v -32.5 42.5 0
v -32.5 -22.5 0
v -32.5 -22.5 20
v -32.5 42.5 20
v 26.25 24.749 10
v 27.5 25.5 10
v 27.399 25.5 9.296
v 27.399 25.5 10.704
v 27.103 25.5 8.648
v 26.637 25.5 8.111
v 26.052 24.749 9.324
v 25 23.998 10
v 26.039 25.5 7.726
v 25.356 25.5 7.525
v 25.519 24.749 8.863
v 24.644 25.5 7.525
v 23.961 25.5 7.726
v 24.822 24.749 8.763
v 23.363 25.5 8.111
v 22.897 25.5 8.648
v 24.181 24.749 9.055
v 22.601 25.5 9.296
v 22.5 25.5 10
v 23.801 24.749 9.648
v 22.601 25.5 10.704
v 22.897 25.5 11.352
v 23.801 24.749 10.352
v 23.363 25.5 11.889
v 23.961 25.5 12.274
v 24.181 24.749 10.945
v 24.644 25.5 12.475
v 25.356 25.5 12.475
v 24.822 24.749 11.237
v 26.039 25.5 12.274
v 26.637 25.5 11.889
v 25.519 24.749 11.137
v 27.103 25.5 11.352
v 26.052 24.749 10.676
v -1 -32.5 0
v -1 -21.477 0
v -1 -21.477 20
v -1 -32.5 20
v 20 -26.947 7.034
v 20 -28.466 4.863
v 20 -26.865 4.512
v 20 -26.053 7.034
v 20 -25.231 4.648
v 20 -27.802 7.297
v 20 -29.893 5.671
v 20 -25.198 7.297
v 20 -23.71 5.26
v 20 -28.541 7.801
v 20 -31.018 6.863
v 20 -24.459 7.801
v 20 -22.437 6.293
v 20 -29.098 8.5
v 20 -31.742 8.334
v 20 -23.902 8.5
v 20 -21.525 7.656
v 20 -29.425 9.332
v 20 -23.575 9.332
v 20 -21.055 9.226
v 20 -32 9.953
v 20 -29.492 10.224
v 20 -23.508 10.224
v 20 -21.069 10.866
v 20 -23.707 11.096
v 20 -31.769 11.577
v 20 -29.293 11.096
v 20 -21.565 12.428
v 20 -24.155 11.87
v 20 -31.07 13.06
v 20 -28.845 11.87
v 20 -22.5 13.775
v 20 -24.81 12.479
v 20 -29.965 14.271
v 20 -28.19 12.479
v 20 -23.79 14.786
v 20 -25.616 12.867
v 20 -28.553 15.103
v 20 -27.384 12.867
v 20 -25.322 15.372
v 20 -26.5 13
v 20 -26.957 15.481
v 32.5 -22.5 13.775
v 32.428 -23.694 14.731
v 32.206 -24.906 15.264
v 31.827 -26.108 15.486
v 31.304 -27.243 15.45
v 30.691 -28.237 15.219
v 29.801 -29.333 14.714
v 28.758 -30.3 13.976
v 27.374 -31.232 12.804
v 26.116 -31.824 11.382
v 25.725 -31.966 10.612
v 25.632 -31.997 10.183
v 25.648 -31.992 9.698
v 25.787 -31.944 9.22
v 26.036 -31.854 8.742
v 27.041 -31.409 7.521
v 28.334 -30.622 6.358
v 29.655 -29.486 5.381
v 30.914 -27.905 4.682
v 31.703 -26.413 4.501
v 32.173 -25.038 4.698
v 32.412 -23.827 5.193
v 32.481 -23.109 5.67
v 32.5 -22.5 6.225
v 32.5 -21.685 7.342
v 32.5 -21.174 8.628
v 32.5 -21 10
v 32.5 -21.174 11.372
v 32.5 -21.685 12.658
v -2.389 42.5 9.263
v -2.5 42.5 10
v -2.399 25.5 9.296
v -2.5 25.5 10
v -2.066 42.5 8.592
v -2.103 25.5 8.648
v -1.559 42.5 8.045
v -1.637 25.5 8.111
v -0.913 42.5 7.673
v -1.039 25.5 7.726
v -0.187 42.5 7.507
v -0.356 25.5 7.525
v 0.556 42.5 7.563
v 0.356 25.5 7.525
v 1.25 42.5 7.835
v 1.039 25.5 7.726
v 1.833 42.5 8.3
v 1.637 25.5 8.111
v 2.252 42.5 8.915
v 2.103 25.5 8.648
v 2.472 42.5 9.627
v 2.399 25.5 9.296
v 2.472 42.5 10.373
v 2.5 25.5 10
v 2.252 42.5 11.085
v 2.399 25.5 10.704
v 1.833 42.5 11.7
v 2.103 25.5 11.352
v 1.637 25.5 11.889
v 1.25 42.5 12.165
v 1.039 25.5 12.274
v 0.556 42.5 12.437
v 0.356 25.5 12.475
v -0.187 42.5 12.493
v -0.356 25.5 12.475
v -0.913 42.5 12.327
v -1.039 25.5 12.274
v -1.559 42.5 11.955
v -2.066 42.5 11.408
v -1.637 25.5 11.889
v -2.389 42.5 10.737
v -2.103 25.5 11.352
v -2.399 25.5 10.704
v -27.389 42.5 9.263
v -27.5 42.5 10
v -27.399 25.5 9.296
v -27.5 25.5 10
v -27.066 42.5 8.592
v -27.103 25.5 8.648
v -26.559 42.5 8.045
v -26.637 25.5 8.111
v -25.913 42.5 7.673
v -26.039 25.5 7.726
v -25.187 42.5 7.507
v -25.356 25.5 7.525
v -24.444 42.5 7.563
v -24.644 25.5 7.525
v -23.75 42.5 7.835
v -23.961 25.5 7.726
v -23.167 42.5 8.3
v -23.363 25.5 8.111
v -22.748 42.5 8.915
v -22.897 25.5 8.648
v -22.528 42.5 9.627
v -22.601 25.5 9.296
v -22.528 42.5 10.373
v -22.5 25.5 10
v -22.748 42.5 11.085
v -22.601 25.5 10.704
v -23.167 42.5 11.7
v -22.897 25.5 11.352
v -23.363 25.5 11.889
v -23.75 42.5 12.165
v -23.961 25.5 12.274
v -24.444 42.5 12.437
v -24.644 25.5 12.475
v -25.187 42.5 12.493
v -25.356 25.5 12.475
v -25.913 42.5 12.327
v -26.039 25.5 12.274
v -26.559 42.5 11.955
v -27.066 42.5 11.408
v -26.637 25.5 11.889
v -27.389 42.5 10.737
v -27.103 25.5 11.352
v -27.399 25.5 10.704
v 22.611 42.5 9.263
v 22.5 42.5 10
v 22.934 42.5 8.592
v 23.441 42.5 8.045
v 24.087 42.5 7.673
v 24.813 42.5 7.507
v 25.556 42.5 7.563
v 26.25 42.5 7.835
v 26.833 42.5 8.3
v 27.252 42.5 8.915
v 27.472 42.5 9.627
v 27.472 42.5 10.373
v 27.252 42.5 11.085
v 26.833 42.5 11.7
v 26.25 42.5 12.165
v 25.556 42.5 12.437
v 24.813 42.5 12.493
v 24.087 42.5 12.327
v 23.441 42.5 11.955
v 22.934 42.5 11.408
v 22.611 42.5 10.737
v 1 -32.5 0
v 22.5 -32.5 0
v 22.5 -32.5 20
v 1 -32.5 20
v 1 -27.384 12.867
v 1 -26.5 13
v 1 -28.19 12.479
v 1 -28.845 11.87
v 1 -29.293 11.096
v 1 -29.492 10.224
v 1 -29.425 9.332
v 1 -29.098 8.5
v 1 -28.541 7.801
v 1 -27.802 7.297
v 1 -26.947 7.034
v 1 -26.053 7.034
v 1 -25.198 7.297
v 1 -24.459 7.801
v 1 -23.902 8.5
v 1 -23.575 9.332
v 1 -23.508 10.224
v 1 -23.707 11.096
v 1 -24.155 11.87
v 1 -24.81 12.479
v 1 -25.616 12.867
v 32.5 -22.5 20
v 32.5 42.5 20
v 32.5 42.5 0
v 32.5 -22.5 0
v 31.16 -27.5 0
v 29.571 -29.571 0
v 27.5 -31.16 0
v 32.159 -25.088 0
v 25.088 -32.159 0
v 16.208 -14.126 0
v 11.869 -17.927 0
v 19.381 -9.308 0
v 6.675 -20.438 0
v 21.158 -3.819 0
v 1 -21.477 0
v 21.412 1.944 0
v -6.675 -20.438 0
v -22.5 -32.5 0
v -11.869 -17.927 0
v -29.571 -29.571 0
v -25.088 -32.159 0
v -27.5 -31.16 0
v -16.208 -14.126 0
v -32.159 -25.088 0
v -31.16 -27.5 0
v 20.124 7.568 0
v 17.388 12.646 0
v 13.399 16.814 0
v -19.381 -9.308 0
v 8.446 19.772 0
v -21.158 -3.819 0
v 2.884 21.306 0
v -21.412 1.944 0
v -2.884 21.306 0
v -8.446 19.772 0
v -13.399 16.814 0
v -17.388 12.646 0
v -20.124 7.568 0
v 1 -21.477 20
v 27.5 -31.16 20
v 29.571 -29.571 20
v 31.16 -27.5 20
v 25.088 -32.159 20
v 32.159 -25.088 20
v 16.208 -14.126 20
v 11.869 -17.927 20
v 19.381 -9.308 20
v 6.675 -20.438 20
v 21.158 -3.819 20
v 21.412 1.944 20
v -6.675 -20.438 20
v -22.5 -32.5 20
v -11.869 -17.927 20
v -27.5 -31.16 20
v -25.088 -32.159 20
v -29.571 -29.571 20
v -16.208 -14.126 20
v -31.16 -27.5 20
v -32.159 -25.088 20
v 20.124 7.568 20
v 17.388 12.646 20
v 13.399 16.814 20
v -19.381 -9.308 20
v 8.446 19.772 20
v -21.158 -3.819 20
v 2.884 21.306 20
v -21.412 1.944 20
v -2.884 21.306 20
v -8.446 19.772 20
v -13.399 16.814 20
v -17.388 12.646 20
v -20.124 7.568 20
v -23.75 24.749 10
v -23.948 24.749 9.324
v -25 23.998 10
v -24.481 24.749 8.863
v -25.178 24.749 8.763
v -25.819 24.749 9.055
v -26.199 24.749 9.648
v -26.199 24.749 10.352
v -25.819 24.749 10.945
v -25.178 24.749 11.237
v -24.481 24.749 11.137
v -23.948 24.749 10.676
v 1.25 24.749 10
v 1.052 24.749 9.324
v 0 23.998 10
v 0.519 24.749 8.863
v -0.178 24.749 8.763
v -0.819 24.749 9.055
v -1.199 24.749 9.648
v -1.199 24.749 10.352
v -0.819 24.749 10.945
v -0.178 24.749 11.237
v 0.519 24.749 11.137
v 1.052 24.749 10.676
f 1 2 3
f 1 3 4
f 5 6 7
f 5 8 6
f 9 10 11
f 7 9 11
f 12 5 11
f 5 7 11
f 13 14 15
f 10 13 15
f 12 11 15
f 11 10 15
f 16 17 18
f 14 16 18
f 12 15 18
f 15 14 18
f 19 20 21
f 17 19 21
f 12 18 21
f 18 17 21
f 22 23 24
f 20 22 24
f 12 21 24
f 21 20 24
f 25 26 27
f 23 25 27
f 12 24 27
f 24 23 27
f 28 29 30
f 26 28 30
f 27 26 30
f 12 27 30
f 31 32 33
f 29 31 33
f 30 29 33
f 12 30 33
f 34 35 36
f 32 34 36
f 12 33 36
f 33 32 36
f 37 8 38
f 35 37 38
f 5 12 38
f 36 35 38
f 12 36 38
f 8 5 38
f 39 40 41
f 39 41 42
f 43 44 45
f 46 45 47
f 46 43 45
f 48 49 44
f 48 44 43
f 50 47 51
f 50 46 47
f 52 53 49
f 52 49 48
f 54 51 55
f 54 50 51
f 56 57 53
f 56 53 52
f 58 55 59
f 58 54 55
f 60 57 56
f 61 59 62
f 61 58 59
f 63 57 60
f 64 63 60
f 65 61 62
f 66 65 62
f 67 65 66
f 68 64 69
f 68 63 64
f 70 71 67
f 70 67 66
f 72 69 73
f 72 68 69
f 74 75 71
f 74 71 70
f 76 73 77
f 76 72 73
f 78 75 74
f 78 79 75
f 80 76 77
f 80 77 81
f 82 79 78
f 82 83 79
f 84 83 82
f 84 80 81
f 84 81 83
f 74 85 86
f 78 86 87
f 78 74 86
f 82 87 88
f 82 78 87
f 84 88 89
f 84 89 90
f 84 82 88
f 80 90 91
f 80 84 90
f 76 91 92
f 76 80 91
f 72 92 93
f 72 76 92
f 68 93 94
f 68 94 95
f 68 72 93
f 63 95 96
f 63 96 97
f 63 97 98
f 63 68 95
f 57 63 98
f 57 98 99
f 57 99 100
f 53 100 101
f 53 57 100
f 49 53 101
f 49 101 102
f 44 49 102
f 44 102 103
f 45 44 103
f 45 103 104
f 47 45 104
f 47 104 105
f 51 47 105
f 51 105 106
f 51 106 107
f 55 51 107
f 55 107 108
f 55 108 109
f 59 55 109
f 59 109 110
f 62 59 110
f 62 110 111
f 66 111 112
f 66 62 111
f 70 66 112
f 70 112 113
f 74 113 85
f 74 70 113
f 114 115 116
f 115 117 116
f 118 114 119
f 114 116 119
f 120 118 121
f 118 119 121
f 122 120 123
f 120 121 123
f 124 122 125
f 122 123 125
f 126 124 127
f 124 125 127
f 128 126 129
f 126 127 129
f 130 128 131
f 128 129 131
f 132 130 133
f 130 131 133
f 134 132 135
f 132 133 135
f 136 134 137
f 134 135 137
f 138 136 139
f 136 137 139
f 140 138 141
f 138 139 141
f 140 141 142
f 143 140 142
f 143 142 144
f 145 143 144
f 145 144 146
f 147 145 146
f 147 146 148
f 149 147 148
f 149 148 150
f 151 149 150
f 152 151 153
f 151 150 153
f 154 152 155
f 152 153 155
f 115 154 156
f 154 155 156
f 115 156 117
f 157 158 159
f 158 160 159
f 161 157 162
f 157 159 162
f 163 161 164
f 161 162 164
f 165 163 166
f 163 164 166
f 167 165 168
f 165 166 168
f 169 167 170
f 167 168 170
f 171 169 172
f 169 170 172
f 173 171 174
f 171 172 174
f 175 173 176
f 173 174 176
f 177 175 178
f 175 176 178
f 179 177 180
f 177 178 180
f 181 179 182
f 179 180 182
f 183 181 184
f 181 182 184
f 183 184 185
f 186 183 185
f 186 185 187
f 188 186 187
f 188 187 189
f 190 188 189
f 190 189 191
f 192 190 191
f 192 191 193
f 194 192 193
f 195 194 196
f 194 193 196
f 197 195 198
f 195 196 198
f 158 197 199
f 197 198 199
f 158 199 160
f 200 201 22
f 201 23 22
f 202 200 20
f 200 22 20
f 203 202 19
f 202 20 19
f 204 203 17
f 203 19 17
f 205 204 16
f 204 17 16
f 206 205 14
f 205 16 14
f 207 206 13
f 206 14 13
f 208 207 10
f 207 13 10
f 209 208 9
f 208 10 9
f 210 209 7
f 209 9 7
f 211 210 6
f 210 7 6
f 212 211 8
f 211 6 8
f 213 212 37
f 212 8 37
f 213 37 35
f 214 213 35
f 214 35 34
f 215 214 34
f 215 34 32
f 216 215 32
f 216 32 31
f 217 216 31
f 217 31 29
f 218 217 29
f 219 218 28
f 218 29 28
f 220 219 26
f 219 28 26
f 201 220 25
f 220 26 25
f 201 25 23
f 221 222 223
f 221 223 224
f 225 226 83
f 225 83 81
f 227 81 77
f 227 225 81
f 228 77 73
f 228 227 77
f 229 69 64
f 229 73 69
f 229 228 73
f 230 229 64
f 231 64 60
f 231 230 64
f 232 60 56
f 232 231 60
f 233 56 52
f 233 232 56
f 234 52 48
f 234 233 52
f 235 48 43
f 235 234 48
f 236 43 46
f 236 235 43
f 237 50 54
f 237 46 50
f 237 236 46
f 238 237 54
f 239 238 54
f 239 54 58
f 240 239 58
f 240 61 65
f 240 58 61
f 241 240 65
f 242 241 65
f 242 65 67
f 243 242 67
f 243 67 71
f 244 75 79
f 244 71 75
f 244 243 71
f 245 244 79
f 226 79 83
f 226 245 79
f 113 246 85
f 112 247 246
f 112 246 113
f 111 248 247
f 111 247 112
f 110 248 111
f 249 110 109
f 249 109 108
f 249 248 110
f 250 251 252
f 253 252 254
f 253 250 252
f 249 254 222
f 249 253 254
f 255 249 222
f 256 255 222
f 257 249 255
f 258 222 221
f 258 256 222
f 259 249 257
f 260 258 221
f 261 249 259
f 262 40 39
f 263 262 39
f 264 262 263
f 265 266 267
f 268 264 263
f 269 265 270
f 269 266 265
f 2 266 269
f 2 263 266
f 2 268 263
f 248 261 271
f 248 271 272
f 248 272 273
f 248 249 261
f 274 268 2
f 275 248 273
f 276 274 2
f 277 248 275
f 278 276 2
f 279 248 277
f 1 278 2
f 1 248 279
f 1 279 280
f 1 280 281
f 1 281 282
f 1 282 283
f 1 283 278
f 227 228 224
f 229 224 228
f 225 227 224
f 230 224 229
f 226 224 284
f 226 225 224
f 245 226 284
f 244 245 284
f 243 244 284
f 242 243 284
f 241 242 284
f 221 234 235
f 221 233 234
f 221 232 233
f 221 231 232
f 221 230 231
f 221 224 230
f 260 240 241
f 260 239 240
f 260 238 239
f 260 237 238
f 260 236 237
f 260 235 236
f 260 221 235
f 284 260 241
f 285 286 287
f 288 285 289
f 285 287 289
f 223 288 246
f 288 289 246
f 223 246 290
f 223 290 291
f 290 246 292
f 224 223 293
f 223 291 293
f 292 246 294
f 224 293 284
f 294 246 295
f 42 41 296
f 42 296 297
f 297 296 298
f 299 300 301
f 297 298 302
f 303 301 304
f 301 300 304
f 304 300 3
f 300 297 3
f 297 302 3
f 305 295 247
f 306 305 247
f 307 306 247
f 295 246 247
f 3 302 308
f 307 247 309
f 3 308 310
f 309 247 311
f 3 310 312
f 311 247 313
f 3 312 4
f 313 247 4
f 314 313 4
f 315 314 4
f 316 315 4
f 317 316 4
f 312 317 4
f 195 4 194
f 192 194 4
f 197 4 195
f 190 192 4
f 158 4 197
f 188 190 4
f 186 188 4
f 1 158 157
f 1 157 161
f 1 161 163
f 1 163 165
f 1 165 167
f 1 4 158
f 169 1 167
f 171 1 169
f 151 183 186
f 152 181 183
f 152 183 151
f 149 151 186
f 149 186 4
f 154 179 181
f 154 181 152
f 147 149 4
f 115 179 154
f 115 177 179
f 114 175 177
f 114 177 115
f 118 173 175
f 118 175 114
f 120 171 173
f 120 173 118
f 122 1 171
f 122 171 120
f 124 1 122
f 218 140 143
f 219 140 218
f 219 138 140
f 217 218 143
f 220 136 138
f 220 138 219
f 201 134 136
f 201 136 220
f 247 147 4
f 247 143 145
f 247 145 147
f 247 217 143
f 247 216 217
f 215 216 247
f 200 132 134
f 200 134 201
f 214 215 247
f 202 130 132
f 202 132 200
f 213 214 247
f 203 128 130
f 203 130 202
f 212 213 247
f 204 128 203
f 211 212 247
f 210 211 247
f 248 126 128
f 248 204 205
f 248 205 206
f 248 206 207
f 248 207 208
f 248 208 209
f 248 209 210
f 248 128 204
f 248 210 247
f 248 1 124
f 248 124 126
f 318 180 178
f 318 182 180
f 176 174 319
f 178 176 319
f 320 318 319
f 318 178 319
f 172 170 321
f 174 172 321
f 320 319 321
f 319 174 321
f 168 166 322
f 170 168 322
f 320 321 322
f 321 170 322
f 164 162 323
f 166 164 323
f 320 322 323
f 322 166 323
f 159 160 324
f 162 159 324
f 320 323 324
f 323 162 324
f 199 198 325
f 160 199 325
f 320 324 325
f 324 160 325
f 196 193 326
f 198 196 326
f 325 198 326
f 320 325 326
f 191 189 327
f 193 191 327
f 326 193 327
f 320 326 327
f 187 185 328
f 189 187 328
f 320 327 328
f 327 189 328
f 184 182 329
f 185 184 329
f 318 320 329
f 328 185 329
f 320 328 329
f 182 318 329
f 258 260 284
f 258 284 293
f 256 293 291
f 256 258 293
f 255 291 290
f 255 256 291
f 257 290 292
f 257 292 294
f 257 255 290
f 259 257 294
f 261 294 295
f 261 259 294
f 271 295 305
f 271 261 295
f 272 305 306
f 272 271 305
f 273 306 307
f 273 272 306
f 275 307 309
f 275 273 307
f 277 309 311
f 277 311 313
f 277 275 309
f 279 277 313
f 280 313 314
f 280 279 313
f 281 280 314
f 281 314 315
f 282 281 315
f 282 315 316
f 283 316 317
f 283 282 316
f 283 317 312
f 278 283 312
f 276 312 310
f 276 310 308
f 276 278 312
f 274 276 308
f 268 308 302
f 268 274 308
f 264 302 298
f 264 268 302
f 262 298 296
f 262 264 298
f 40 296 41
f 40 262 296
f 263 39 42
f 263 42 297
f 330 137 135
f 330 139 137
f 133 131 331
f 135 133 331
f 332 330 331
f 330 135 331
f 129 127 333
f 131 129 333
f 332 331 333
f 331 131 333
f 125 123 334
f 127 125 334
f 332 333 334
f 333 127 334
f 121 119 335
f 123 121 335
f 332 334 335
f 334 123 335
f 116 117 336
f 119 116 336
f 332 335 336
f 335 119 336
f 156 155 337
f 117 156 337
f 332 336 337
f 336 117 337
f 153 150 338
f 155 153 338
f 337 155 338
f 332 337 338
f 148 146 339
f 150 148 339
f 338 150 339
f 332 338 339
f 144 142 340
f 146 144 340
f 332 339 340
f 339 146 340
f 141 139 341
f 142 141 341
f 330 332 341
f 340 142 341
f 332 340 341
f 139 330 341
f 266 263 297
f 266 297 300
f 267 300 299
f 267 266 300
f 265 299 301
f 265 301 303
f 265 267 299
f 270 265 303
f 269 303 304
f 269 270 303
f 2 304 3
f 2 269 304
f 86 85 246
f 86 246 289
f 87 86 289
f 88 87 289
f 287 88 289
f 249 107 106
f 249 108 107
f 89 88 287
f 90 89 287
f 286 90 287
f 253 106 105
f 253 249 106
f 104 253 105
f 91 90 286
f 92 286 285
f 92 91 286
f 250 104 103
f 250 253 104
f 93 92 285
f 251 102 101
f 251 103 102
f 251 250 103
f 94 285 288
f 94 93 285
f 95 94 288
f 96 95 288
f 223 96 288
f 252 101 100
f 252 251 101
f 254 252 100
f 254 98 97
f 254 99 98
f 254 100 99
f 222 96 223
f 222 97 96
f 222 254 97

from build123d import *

# Parameters (mm, degrees)
AUFSATZ_LINEAR_AUSTRAGEN1_DEPTH = 20
M6_GEWINDEBOHRUNG1_D            = 5
M6_GEWINDEBOHRUNG1_DEPTH        = 17
M6_GEWINDEBOHRUNG1_TIP          = 1.502151548
SKIZZE4_R                       = 3
SCHNITT_LINEAR_AUSTRAGEN1_DEPTH = 40
SCHNITT_LINEAR_START            = 20
SKIZZE5_R                       = 5.5
SCHNITT_LINEAR_AUSTRAGEN2_DEPTH = 20


with BuildPart() as part:
    # Skizze1 → Aufsatz-Linear austragen1 (new body)
    with BuildSketch(Plane.XY):
        with BuildLine():
            Line((-32.5, 42.5), (32.5, 42.5))
            Line((32.5, 42.5), (32.5, -22.5))
            ThreePointArc((32.5, -22.5), (29.571067812, -29.571067812), (22.5, -32.5))
            Line((22.5, -32.5), (1, -32.5))
            Line((1, -32.5), (1, -21.476731595))
            ThreePointArc((1, -21.476731595), (0, 21.5), (-1, -21.476731595))
            Line((-1, -21.476731595), (-1, -32.5))
            Line((-1, -32.5), (-22.5, -32.5))
            ThreePointArc((-22.5, -32.5), (-29.571067812, -29.571067812), (-32.5, -22.5))
            Line((-32.5, -22.5), (-32.5, 42.5))
        make_face()
    extrude(amount=AUFSATZ_LINEAR_AUSTRAGEN1_DEPTH)

    # M6 Gewindebohrung1
    with Locations(Plane(origin=(0, 42.5, 0), x_dir=(1, 0, 0), z_dir=(0, 1, 0))):
        with Locations((-25, -10), (0, -10), (25, -10)):
            Hole(M6_GEWINDEBOHRUNG1_D / 2, depth=M6_GEWINDEBOHRUNG1_DEPTH)
            with Locations((0, 0, -(M6_GEWINDEBOHRUNG1_DEPTH + M6_GEWINDEBOHRUNG1_TIP / 2))):  # 118° drill point
                Cone(0, M6_GEWINDEBOHRUNG1_D / 2, M6_GEWINDEBOHRUNG1_TIP, mode=Mode.SUBTRACT)

    # Skizze4 → Schnitt-Linear austragen1 (cut)
    with BuildSketch(Plane(origin=(0, 0, 0), x_dir=(0, 0, -1), z_dir=(1, 0, 0))):
        with Locations(Location((-10, -26.5, 0), (0, 0, 180))):
            Circle(SKIZZE4_R)
    extrude(amount=SCHNITT_LINEAR_AUSTRAGEN1_DEPTH, mode=Mode.SUBTRACT)

    # Skizze5 → Schnitt-Linear austragen2 (cut)
    with BuildSketch(Plane(origin=(0, 0, 0), x_dir=(0, 0, -1), z_dir=(1, 0, 0)).offset(SCHNITT_LINEAR_START)):
        with Locations(Location((-10, -26.5, 0), (0, 0, 133.341758227))):
            Circle(SKIZZE5_R)
    extrude(amount=SCHNITT_LINEAR_AUSTRAGEN2_DEPTH, mode=Mode.SUBTRACT)


solid = part.part
